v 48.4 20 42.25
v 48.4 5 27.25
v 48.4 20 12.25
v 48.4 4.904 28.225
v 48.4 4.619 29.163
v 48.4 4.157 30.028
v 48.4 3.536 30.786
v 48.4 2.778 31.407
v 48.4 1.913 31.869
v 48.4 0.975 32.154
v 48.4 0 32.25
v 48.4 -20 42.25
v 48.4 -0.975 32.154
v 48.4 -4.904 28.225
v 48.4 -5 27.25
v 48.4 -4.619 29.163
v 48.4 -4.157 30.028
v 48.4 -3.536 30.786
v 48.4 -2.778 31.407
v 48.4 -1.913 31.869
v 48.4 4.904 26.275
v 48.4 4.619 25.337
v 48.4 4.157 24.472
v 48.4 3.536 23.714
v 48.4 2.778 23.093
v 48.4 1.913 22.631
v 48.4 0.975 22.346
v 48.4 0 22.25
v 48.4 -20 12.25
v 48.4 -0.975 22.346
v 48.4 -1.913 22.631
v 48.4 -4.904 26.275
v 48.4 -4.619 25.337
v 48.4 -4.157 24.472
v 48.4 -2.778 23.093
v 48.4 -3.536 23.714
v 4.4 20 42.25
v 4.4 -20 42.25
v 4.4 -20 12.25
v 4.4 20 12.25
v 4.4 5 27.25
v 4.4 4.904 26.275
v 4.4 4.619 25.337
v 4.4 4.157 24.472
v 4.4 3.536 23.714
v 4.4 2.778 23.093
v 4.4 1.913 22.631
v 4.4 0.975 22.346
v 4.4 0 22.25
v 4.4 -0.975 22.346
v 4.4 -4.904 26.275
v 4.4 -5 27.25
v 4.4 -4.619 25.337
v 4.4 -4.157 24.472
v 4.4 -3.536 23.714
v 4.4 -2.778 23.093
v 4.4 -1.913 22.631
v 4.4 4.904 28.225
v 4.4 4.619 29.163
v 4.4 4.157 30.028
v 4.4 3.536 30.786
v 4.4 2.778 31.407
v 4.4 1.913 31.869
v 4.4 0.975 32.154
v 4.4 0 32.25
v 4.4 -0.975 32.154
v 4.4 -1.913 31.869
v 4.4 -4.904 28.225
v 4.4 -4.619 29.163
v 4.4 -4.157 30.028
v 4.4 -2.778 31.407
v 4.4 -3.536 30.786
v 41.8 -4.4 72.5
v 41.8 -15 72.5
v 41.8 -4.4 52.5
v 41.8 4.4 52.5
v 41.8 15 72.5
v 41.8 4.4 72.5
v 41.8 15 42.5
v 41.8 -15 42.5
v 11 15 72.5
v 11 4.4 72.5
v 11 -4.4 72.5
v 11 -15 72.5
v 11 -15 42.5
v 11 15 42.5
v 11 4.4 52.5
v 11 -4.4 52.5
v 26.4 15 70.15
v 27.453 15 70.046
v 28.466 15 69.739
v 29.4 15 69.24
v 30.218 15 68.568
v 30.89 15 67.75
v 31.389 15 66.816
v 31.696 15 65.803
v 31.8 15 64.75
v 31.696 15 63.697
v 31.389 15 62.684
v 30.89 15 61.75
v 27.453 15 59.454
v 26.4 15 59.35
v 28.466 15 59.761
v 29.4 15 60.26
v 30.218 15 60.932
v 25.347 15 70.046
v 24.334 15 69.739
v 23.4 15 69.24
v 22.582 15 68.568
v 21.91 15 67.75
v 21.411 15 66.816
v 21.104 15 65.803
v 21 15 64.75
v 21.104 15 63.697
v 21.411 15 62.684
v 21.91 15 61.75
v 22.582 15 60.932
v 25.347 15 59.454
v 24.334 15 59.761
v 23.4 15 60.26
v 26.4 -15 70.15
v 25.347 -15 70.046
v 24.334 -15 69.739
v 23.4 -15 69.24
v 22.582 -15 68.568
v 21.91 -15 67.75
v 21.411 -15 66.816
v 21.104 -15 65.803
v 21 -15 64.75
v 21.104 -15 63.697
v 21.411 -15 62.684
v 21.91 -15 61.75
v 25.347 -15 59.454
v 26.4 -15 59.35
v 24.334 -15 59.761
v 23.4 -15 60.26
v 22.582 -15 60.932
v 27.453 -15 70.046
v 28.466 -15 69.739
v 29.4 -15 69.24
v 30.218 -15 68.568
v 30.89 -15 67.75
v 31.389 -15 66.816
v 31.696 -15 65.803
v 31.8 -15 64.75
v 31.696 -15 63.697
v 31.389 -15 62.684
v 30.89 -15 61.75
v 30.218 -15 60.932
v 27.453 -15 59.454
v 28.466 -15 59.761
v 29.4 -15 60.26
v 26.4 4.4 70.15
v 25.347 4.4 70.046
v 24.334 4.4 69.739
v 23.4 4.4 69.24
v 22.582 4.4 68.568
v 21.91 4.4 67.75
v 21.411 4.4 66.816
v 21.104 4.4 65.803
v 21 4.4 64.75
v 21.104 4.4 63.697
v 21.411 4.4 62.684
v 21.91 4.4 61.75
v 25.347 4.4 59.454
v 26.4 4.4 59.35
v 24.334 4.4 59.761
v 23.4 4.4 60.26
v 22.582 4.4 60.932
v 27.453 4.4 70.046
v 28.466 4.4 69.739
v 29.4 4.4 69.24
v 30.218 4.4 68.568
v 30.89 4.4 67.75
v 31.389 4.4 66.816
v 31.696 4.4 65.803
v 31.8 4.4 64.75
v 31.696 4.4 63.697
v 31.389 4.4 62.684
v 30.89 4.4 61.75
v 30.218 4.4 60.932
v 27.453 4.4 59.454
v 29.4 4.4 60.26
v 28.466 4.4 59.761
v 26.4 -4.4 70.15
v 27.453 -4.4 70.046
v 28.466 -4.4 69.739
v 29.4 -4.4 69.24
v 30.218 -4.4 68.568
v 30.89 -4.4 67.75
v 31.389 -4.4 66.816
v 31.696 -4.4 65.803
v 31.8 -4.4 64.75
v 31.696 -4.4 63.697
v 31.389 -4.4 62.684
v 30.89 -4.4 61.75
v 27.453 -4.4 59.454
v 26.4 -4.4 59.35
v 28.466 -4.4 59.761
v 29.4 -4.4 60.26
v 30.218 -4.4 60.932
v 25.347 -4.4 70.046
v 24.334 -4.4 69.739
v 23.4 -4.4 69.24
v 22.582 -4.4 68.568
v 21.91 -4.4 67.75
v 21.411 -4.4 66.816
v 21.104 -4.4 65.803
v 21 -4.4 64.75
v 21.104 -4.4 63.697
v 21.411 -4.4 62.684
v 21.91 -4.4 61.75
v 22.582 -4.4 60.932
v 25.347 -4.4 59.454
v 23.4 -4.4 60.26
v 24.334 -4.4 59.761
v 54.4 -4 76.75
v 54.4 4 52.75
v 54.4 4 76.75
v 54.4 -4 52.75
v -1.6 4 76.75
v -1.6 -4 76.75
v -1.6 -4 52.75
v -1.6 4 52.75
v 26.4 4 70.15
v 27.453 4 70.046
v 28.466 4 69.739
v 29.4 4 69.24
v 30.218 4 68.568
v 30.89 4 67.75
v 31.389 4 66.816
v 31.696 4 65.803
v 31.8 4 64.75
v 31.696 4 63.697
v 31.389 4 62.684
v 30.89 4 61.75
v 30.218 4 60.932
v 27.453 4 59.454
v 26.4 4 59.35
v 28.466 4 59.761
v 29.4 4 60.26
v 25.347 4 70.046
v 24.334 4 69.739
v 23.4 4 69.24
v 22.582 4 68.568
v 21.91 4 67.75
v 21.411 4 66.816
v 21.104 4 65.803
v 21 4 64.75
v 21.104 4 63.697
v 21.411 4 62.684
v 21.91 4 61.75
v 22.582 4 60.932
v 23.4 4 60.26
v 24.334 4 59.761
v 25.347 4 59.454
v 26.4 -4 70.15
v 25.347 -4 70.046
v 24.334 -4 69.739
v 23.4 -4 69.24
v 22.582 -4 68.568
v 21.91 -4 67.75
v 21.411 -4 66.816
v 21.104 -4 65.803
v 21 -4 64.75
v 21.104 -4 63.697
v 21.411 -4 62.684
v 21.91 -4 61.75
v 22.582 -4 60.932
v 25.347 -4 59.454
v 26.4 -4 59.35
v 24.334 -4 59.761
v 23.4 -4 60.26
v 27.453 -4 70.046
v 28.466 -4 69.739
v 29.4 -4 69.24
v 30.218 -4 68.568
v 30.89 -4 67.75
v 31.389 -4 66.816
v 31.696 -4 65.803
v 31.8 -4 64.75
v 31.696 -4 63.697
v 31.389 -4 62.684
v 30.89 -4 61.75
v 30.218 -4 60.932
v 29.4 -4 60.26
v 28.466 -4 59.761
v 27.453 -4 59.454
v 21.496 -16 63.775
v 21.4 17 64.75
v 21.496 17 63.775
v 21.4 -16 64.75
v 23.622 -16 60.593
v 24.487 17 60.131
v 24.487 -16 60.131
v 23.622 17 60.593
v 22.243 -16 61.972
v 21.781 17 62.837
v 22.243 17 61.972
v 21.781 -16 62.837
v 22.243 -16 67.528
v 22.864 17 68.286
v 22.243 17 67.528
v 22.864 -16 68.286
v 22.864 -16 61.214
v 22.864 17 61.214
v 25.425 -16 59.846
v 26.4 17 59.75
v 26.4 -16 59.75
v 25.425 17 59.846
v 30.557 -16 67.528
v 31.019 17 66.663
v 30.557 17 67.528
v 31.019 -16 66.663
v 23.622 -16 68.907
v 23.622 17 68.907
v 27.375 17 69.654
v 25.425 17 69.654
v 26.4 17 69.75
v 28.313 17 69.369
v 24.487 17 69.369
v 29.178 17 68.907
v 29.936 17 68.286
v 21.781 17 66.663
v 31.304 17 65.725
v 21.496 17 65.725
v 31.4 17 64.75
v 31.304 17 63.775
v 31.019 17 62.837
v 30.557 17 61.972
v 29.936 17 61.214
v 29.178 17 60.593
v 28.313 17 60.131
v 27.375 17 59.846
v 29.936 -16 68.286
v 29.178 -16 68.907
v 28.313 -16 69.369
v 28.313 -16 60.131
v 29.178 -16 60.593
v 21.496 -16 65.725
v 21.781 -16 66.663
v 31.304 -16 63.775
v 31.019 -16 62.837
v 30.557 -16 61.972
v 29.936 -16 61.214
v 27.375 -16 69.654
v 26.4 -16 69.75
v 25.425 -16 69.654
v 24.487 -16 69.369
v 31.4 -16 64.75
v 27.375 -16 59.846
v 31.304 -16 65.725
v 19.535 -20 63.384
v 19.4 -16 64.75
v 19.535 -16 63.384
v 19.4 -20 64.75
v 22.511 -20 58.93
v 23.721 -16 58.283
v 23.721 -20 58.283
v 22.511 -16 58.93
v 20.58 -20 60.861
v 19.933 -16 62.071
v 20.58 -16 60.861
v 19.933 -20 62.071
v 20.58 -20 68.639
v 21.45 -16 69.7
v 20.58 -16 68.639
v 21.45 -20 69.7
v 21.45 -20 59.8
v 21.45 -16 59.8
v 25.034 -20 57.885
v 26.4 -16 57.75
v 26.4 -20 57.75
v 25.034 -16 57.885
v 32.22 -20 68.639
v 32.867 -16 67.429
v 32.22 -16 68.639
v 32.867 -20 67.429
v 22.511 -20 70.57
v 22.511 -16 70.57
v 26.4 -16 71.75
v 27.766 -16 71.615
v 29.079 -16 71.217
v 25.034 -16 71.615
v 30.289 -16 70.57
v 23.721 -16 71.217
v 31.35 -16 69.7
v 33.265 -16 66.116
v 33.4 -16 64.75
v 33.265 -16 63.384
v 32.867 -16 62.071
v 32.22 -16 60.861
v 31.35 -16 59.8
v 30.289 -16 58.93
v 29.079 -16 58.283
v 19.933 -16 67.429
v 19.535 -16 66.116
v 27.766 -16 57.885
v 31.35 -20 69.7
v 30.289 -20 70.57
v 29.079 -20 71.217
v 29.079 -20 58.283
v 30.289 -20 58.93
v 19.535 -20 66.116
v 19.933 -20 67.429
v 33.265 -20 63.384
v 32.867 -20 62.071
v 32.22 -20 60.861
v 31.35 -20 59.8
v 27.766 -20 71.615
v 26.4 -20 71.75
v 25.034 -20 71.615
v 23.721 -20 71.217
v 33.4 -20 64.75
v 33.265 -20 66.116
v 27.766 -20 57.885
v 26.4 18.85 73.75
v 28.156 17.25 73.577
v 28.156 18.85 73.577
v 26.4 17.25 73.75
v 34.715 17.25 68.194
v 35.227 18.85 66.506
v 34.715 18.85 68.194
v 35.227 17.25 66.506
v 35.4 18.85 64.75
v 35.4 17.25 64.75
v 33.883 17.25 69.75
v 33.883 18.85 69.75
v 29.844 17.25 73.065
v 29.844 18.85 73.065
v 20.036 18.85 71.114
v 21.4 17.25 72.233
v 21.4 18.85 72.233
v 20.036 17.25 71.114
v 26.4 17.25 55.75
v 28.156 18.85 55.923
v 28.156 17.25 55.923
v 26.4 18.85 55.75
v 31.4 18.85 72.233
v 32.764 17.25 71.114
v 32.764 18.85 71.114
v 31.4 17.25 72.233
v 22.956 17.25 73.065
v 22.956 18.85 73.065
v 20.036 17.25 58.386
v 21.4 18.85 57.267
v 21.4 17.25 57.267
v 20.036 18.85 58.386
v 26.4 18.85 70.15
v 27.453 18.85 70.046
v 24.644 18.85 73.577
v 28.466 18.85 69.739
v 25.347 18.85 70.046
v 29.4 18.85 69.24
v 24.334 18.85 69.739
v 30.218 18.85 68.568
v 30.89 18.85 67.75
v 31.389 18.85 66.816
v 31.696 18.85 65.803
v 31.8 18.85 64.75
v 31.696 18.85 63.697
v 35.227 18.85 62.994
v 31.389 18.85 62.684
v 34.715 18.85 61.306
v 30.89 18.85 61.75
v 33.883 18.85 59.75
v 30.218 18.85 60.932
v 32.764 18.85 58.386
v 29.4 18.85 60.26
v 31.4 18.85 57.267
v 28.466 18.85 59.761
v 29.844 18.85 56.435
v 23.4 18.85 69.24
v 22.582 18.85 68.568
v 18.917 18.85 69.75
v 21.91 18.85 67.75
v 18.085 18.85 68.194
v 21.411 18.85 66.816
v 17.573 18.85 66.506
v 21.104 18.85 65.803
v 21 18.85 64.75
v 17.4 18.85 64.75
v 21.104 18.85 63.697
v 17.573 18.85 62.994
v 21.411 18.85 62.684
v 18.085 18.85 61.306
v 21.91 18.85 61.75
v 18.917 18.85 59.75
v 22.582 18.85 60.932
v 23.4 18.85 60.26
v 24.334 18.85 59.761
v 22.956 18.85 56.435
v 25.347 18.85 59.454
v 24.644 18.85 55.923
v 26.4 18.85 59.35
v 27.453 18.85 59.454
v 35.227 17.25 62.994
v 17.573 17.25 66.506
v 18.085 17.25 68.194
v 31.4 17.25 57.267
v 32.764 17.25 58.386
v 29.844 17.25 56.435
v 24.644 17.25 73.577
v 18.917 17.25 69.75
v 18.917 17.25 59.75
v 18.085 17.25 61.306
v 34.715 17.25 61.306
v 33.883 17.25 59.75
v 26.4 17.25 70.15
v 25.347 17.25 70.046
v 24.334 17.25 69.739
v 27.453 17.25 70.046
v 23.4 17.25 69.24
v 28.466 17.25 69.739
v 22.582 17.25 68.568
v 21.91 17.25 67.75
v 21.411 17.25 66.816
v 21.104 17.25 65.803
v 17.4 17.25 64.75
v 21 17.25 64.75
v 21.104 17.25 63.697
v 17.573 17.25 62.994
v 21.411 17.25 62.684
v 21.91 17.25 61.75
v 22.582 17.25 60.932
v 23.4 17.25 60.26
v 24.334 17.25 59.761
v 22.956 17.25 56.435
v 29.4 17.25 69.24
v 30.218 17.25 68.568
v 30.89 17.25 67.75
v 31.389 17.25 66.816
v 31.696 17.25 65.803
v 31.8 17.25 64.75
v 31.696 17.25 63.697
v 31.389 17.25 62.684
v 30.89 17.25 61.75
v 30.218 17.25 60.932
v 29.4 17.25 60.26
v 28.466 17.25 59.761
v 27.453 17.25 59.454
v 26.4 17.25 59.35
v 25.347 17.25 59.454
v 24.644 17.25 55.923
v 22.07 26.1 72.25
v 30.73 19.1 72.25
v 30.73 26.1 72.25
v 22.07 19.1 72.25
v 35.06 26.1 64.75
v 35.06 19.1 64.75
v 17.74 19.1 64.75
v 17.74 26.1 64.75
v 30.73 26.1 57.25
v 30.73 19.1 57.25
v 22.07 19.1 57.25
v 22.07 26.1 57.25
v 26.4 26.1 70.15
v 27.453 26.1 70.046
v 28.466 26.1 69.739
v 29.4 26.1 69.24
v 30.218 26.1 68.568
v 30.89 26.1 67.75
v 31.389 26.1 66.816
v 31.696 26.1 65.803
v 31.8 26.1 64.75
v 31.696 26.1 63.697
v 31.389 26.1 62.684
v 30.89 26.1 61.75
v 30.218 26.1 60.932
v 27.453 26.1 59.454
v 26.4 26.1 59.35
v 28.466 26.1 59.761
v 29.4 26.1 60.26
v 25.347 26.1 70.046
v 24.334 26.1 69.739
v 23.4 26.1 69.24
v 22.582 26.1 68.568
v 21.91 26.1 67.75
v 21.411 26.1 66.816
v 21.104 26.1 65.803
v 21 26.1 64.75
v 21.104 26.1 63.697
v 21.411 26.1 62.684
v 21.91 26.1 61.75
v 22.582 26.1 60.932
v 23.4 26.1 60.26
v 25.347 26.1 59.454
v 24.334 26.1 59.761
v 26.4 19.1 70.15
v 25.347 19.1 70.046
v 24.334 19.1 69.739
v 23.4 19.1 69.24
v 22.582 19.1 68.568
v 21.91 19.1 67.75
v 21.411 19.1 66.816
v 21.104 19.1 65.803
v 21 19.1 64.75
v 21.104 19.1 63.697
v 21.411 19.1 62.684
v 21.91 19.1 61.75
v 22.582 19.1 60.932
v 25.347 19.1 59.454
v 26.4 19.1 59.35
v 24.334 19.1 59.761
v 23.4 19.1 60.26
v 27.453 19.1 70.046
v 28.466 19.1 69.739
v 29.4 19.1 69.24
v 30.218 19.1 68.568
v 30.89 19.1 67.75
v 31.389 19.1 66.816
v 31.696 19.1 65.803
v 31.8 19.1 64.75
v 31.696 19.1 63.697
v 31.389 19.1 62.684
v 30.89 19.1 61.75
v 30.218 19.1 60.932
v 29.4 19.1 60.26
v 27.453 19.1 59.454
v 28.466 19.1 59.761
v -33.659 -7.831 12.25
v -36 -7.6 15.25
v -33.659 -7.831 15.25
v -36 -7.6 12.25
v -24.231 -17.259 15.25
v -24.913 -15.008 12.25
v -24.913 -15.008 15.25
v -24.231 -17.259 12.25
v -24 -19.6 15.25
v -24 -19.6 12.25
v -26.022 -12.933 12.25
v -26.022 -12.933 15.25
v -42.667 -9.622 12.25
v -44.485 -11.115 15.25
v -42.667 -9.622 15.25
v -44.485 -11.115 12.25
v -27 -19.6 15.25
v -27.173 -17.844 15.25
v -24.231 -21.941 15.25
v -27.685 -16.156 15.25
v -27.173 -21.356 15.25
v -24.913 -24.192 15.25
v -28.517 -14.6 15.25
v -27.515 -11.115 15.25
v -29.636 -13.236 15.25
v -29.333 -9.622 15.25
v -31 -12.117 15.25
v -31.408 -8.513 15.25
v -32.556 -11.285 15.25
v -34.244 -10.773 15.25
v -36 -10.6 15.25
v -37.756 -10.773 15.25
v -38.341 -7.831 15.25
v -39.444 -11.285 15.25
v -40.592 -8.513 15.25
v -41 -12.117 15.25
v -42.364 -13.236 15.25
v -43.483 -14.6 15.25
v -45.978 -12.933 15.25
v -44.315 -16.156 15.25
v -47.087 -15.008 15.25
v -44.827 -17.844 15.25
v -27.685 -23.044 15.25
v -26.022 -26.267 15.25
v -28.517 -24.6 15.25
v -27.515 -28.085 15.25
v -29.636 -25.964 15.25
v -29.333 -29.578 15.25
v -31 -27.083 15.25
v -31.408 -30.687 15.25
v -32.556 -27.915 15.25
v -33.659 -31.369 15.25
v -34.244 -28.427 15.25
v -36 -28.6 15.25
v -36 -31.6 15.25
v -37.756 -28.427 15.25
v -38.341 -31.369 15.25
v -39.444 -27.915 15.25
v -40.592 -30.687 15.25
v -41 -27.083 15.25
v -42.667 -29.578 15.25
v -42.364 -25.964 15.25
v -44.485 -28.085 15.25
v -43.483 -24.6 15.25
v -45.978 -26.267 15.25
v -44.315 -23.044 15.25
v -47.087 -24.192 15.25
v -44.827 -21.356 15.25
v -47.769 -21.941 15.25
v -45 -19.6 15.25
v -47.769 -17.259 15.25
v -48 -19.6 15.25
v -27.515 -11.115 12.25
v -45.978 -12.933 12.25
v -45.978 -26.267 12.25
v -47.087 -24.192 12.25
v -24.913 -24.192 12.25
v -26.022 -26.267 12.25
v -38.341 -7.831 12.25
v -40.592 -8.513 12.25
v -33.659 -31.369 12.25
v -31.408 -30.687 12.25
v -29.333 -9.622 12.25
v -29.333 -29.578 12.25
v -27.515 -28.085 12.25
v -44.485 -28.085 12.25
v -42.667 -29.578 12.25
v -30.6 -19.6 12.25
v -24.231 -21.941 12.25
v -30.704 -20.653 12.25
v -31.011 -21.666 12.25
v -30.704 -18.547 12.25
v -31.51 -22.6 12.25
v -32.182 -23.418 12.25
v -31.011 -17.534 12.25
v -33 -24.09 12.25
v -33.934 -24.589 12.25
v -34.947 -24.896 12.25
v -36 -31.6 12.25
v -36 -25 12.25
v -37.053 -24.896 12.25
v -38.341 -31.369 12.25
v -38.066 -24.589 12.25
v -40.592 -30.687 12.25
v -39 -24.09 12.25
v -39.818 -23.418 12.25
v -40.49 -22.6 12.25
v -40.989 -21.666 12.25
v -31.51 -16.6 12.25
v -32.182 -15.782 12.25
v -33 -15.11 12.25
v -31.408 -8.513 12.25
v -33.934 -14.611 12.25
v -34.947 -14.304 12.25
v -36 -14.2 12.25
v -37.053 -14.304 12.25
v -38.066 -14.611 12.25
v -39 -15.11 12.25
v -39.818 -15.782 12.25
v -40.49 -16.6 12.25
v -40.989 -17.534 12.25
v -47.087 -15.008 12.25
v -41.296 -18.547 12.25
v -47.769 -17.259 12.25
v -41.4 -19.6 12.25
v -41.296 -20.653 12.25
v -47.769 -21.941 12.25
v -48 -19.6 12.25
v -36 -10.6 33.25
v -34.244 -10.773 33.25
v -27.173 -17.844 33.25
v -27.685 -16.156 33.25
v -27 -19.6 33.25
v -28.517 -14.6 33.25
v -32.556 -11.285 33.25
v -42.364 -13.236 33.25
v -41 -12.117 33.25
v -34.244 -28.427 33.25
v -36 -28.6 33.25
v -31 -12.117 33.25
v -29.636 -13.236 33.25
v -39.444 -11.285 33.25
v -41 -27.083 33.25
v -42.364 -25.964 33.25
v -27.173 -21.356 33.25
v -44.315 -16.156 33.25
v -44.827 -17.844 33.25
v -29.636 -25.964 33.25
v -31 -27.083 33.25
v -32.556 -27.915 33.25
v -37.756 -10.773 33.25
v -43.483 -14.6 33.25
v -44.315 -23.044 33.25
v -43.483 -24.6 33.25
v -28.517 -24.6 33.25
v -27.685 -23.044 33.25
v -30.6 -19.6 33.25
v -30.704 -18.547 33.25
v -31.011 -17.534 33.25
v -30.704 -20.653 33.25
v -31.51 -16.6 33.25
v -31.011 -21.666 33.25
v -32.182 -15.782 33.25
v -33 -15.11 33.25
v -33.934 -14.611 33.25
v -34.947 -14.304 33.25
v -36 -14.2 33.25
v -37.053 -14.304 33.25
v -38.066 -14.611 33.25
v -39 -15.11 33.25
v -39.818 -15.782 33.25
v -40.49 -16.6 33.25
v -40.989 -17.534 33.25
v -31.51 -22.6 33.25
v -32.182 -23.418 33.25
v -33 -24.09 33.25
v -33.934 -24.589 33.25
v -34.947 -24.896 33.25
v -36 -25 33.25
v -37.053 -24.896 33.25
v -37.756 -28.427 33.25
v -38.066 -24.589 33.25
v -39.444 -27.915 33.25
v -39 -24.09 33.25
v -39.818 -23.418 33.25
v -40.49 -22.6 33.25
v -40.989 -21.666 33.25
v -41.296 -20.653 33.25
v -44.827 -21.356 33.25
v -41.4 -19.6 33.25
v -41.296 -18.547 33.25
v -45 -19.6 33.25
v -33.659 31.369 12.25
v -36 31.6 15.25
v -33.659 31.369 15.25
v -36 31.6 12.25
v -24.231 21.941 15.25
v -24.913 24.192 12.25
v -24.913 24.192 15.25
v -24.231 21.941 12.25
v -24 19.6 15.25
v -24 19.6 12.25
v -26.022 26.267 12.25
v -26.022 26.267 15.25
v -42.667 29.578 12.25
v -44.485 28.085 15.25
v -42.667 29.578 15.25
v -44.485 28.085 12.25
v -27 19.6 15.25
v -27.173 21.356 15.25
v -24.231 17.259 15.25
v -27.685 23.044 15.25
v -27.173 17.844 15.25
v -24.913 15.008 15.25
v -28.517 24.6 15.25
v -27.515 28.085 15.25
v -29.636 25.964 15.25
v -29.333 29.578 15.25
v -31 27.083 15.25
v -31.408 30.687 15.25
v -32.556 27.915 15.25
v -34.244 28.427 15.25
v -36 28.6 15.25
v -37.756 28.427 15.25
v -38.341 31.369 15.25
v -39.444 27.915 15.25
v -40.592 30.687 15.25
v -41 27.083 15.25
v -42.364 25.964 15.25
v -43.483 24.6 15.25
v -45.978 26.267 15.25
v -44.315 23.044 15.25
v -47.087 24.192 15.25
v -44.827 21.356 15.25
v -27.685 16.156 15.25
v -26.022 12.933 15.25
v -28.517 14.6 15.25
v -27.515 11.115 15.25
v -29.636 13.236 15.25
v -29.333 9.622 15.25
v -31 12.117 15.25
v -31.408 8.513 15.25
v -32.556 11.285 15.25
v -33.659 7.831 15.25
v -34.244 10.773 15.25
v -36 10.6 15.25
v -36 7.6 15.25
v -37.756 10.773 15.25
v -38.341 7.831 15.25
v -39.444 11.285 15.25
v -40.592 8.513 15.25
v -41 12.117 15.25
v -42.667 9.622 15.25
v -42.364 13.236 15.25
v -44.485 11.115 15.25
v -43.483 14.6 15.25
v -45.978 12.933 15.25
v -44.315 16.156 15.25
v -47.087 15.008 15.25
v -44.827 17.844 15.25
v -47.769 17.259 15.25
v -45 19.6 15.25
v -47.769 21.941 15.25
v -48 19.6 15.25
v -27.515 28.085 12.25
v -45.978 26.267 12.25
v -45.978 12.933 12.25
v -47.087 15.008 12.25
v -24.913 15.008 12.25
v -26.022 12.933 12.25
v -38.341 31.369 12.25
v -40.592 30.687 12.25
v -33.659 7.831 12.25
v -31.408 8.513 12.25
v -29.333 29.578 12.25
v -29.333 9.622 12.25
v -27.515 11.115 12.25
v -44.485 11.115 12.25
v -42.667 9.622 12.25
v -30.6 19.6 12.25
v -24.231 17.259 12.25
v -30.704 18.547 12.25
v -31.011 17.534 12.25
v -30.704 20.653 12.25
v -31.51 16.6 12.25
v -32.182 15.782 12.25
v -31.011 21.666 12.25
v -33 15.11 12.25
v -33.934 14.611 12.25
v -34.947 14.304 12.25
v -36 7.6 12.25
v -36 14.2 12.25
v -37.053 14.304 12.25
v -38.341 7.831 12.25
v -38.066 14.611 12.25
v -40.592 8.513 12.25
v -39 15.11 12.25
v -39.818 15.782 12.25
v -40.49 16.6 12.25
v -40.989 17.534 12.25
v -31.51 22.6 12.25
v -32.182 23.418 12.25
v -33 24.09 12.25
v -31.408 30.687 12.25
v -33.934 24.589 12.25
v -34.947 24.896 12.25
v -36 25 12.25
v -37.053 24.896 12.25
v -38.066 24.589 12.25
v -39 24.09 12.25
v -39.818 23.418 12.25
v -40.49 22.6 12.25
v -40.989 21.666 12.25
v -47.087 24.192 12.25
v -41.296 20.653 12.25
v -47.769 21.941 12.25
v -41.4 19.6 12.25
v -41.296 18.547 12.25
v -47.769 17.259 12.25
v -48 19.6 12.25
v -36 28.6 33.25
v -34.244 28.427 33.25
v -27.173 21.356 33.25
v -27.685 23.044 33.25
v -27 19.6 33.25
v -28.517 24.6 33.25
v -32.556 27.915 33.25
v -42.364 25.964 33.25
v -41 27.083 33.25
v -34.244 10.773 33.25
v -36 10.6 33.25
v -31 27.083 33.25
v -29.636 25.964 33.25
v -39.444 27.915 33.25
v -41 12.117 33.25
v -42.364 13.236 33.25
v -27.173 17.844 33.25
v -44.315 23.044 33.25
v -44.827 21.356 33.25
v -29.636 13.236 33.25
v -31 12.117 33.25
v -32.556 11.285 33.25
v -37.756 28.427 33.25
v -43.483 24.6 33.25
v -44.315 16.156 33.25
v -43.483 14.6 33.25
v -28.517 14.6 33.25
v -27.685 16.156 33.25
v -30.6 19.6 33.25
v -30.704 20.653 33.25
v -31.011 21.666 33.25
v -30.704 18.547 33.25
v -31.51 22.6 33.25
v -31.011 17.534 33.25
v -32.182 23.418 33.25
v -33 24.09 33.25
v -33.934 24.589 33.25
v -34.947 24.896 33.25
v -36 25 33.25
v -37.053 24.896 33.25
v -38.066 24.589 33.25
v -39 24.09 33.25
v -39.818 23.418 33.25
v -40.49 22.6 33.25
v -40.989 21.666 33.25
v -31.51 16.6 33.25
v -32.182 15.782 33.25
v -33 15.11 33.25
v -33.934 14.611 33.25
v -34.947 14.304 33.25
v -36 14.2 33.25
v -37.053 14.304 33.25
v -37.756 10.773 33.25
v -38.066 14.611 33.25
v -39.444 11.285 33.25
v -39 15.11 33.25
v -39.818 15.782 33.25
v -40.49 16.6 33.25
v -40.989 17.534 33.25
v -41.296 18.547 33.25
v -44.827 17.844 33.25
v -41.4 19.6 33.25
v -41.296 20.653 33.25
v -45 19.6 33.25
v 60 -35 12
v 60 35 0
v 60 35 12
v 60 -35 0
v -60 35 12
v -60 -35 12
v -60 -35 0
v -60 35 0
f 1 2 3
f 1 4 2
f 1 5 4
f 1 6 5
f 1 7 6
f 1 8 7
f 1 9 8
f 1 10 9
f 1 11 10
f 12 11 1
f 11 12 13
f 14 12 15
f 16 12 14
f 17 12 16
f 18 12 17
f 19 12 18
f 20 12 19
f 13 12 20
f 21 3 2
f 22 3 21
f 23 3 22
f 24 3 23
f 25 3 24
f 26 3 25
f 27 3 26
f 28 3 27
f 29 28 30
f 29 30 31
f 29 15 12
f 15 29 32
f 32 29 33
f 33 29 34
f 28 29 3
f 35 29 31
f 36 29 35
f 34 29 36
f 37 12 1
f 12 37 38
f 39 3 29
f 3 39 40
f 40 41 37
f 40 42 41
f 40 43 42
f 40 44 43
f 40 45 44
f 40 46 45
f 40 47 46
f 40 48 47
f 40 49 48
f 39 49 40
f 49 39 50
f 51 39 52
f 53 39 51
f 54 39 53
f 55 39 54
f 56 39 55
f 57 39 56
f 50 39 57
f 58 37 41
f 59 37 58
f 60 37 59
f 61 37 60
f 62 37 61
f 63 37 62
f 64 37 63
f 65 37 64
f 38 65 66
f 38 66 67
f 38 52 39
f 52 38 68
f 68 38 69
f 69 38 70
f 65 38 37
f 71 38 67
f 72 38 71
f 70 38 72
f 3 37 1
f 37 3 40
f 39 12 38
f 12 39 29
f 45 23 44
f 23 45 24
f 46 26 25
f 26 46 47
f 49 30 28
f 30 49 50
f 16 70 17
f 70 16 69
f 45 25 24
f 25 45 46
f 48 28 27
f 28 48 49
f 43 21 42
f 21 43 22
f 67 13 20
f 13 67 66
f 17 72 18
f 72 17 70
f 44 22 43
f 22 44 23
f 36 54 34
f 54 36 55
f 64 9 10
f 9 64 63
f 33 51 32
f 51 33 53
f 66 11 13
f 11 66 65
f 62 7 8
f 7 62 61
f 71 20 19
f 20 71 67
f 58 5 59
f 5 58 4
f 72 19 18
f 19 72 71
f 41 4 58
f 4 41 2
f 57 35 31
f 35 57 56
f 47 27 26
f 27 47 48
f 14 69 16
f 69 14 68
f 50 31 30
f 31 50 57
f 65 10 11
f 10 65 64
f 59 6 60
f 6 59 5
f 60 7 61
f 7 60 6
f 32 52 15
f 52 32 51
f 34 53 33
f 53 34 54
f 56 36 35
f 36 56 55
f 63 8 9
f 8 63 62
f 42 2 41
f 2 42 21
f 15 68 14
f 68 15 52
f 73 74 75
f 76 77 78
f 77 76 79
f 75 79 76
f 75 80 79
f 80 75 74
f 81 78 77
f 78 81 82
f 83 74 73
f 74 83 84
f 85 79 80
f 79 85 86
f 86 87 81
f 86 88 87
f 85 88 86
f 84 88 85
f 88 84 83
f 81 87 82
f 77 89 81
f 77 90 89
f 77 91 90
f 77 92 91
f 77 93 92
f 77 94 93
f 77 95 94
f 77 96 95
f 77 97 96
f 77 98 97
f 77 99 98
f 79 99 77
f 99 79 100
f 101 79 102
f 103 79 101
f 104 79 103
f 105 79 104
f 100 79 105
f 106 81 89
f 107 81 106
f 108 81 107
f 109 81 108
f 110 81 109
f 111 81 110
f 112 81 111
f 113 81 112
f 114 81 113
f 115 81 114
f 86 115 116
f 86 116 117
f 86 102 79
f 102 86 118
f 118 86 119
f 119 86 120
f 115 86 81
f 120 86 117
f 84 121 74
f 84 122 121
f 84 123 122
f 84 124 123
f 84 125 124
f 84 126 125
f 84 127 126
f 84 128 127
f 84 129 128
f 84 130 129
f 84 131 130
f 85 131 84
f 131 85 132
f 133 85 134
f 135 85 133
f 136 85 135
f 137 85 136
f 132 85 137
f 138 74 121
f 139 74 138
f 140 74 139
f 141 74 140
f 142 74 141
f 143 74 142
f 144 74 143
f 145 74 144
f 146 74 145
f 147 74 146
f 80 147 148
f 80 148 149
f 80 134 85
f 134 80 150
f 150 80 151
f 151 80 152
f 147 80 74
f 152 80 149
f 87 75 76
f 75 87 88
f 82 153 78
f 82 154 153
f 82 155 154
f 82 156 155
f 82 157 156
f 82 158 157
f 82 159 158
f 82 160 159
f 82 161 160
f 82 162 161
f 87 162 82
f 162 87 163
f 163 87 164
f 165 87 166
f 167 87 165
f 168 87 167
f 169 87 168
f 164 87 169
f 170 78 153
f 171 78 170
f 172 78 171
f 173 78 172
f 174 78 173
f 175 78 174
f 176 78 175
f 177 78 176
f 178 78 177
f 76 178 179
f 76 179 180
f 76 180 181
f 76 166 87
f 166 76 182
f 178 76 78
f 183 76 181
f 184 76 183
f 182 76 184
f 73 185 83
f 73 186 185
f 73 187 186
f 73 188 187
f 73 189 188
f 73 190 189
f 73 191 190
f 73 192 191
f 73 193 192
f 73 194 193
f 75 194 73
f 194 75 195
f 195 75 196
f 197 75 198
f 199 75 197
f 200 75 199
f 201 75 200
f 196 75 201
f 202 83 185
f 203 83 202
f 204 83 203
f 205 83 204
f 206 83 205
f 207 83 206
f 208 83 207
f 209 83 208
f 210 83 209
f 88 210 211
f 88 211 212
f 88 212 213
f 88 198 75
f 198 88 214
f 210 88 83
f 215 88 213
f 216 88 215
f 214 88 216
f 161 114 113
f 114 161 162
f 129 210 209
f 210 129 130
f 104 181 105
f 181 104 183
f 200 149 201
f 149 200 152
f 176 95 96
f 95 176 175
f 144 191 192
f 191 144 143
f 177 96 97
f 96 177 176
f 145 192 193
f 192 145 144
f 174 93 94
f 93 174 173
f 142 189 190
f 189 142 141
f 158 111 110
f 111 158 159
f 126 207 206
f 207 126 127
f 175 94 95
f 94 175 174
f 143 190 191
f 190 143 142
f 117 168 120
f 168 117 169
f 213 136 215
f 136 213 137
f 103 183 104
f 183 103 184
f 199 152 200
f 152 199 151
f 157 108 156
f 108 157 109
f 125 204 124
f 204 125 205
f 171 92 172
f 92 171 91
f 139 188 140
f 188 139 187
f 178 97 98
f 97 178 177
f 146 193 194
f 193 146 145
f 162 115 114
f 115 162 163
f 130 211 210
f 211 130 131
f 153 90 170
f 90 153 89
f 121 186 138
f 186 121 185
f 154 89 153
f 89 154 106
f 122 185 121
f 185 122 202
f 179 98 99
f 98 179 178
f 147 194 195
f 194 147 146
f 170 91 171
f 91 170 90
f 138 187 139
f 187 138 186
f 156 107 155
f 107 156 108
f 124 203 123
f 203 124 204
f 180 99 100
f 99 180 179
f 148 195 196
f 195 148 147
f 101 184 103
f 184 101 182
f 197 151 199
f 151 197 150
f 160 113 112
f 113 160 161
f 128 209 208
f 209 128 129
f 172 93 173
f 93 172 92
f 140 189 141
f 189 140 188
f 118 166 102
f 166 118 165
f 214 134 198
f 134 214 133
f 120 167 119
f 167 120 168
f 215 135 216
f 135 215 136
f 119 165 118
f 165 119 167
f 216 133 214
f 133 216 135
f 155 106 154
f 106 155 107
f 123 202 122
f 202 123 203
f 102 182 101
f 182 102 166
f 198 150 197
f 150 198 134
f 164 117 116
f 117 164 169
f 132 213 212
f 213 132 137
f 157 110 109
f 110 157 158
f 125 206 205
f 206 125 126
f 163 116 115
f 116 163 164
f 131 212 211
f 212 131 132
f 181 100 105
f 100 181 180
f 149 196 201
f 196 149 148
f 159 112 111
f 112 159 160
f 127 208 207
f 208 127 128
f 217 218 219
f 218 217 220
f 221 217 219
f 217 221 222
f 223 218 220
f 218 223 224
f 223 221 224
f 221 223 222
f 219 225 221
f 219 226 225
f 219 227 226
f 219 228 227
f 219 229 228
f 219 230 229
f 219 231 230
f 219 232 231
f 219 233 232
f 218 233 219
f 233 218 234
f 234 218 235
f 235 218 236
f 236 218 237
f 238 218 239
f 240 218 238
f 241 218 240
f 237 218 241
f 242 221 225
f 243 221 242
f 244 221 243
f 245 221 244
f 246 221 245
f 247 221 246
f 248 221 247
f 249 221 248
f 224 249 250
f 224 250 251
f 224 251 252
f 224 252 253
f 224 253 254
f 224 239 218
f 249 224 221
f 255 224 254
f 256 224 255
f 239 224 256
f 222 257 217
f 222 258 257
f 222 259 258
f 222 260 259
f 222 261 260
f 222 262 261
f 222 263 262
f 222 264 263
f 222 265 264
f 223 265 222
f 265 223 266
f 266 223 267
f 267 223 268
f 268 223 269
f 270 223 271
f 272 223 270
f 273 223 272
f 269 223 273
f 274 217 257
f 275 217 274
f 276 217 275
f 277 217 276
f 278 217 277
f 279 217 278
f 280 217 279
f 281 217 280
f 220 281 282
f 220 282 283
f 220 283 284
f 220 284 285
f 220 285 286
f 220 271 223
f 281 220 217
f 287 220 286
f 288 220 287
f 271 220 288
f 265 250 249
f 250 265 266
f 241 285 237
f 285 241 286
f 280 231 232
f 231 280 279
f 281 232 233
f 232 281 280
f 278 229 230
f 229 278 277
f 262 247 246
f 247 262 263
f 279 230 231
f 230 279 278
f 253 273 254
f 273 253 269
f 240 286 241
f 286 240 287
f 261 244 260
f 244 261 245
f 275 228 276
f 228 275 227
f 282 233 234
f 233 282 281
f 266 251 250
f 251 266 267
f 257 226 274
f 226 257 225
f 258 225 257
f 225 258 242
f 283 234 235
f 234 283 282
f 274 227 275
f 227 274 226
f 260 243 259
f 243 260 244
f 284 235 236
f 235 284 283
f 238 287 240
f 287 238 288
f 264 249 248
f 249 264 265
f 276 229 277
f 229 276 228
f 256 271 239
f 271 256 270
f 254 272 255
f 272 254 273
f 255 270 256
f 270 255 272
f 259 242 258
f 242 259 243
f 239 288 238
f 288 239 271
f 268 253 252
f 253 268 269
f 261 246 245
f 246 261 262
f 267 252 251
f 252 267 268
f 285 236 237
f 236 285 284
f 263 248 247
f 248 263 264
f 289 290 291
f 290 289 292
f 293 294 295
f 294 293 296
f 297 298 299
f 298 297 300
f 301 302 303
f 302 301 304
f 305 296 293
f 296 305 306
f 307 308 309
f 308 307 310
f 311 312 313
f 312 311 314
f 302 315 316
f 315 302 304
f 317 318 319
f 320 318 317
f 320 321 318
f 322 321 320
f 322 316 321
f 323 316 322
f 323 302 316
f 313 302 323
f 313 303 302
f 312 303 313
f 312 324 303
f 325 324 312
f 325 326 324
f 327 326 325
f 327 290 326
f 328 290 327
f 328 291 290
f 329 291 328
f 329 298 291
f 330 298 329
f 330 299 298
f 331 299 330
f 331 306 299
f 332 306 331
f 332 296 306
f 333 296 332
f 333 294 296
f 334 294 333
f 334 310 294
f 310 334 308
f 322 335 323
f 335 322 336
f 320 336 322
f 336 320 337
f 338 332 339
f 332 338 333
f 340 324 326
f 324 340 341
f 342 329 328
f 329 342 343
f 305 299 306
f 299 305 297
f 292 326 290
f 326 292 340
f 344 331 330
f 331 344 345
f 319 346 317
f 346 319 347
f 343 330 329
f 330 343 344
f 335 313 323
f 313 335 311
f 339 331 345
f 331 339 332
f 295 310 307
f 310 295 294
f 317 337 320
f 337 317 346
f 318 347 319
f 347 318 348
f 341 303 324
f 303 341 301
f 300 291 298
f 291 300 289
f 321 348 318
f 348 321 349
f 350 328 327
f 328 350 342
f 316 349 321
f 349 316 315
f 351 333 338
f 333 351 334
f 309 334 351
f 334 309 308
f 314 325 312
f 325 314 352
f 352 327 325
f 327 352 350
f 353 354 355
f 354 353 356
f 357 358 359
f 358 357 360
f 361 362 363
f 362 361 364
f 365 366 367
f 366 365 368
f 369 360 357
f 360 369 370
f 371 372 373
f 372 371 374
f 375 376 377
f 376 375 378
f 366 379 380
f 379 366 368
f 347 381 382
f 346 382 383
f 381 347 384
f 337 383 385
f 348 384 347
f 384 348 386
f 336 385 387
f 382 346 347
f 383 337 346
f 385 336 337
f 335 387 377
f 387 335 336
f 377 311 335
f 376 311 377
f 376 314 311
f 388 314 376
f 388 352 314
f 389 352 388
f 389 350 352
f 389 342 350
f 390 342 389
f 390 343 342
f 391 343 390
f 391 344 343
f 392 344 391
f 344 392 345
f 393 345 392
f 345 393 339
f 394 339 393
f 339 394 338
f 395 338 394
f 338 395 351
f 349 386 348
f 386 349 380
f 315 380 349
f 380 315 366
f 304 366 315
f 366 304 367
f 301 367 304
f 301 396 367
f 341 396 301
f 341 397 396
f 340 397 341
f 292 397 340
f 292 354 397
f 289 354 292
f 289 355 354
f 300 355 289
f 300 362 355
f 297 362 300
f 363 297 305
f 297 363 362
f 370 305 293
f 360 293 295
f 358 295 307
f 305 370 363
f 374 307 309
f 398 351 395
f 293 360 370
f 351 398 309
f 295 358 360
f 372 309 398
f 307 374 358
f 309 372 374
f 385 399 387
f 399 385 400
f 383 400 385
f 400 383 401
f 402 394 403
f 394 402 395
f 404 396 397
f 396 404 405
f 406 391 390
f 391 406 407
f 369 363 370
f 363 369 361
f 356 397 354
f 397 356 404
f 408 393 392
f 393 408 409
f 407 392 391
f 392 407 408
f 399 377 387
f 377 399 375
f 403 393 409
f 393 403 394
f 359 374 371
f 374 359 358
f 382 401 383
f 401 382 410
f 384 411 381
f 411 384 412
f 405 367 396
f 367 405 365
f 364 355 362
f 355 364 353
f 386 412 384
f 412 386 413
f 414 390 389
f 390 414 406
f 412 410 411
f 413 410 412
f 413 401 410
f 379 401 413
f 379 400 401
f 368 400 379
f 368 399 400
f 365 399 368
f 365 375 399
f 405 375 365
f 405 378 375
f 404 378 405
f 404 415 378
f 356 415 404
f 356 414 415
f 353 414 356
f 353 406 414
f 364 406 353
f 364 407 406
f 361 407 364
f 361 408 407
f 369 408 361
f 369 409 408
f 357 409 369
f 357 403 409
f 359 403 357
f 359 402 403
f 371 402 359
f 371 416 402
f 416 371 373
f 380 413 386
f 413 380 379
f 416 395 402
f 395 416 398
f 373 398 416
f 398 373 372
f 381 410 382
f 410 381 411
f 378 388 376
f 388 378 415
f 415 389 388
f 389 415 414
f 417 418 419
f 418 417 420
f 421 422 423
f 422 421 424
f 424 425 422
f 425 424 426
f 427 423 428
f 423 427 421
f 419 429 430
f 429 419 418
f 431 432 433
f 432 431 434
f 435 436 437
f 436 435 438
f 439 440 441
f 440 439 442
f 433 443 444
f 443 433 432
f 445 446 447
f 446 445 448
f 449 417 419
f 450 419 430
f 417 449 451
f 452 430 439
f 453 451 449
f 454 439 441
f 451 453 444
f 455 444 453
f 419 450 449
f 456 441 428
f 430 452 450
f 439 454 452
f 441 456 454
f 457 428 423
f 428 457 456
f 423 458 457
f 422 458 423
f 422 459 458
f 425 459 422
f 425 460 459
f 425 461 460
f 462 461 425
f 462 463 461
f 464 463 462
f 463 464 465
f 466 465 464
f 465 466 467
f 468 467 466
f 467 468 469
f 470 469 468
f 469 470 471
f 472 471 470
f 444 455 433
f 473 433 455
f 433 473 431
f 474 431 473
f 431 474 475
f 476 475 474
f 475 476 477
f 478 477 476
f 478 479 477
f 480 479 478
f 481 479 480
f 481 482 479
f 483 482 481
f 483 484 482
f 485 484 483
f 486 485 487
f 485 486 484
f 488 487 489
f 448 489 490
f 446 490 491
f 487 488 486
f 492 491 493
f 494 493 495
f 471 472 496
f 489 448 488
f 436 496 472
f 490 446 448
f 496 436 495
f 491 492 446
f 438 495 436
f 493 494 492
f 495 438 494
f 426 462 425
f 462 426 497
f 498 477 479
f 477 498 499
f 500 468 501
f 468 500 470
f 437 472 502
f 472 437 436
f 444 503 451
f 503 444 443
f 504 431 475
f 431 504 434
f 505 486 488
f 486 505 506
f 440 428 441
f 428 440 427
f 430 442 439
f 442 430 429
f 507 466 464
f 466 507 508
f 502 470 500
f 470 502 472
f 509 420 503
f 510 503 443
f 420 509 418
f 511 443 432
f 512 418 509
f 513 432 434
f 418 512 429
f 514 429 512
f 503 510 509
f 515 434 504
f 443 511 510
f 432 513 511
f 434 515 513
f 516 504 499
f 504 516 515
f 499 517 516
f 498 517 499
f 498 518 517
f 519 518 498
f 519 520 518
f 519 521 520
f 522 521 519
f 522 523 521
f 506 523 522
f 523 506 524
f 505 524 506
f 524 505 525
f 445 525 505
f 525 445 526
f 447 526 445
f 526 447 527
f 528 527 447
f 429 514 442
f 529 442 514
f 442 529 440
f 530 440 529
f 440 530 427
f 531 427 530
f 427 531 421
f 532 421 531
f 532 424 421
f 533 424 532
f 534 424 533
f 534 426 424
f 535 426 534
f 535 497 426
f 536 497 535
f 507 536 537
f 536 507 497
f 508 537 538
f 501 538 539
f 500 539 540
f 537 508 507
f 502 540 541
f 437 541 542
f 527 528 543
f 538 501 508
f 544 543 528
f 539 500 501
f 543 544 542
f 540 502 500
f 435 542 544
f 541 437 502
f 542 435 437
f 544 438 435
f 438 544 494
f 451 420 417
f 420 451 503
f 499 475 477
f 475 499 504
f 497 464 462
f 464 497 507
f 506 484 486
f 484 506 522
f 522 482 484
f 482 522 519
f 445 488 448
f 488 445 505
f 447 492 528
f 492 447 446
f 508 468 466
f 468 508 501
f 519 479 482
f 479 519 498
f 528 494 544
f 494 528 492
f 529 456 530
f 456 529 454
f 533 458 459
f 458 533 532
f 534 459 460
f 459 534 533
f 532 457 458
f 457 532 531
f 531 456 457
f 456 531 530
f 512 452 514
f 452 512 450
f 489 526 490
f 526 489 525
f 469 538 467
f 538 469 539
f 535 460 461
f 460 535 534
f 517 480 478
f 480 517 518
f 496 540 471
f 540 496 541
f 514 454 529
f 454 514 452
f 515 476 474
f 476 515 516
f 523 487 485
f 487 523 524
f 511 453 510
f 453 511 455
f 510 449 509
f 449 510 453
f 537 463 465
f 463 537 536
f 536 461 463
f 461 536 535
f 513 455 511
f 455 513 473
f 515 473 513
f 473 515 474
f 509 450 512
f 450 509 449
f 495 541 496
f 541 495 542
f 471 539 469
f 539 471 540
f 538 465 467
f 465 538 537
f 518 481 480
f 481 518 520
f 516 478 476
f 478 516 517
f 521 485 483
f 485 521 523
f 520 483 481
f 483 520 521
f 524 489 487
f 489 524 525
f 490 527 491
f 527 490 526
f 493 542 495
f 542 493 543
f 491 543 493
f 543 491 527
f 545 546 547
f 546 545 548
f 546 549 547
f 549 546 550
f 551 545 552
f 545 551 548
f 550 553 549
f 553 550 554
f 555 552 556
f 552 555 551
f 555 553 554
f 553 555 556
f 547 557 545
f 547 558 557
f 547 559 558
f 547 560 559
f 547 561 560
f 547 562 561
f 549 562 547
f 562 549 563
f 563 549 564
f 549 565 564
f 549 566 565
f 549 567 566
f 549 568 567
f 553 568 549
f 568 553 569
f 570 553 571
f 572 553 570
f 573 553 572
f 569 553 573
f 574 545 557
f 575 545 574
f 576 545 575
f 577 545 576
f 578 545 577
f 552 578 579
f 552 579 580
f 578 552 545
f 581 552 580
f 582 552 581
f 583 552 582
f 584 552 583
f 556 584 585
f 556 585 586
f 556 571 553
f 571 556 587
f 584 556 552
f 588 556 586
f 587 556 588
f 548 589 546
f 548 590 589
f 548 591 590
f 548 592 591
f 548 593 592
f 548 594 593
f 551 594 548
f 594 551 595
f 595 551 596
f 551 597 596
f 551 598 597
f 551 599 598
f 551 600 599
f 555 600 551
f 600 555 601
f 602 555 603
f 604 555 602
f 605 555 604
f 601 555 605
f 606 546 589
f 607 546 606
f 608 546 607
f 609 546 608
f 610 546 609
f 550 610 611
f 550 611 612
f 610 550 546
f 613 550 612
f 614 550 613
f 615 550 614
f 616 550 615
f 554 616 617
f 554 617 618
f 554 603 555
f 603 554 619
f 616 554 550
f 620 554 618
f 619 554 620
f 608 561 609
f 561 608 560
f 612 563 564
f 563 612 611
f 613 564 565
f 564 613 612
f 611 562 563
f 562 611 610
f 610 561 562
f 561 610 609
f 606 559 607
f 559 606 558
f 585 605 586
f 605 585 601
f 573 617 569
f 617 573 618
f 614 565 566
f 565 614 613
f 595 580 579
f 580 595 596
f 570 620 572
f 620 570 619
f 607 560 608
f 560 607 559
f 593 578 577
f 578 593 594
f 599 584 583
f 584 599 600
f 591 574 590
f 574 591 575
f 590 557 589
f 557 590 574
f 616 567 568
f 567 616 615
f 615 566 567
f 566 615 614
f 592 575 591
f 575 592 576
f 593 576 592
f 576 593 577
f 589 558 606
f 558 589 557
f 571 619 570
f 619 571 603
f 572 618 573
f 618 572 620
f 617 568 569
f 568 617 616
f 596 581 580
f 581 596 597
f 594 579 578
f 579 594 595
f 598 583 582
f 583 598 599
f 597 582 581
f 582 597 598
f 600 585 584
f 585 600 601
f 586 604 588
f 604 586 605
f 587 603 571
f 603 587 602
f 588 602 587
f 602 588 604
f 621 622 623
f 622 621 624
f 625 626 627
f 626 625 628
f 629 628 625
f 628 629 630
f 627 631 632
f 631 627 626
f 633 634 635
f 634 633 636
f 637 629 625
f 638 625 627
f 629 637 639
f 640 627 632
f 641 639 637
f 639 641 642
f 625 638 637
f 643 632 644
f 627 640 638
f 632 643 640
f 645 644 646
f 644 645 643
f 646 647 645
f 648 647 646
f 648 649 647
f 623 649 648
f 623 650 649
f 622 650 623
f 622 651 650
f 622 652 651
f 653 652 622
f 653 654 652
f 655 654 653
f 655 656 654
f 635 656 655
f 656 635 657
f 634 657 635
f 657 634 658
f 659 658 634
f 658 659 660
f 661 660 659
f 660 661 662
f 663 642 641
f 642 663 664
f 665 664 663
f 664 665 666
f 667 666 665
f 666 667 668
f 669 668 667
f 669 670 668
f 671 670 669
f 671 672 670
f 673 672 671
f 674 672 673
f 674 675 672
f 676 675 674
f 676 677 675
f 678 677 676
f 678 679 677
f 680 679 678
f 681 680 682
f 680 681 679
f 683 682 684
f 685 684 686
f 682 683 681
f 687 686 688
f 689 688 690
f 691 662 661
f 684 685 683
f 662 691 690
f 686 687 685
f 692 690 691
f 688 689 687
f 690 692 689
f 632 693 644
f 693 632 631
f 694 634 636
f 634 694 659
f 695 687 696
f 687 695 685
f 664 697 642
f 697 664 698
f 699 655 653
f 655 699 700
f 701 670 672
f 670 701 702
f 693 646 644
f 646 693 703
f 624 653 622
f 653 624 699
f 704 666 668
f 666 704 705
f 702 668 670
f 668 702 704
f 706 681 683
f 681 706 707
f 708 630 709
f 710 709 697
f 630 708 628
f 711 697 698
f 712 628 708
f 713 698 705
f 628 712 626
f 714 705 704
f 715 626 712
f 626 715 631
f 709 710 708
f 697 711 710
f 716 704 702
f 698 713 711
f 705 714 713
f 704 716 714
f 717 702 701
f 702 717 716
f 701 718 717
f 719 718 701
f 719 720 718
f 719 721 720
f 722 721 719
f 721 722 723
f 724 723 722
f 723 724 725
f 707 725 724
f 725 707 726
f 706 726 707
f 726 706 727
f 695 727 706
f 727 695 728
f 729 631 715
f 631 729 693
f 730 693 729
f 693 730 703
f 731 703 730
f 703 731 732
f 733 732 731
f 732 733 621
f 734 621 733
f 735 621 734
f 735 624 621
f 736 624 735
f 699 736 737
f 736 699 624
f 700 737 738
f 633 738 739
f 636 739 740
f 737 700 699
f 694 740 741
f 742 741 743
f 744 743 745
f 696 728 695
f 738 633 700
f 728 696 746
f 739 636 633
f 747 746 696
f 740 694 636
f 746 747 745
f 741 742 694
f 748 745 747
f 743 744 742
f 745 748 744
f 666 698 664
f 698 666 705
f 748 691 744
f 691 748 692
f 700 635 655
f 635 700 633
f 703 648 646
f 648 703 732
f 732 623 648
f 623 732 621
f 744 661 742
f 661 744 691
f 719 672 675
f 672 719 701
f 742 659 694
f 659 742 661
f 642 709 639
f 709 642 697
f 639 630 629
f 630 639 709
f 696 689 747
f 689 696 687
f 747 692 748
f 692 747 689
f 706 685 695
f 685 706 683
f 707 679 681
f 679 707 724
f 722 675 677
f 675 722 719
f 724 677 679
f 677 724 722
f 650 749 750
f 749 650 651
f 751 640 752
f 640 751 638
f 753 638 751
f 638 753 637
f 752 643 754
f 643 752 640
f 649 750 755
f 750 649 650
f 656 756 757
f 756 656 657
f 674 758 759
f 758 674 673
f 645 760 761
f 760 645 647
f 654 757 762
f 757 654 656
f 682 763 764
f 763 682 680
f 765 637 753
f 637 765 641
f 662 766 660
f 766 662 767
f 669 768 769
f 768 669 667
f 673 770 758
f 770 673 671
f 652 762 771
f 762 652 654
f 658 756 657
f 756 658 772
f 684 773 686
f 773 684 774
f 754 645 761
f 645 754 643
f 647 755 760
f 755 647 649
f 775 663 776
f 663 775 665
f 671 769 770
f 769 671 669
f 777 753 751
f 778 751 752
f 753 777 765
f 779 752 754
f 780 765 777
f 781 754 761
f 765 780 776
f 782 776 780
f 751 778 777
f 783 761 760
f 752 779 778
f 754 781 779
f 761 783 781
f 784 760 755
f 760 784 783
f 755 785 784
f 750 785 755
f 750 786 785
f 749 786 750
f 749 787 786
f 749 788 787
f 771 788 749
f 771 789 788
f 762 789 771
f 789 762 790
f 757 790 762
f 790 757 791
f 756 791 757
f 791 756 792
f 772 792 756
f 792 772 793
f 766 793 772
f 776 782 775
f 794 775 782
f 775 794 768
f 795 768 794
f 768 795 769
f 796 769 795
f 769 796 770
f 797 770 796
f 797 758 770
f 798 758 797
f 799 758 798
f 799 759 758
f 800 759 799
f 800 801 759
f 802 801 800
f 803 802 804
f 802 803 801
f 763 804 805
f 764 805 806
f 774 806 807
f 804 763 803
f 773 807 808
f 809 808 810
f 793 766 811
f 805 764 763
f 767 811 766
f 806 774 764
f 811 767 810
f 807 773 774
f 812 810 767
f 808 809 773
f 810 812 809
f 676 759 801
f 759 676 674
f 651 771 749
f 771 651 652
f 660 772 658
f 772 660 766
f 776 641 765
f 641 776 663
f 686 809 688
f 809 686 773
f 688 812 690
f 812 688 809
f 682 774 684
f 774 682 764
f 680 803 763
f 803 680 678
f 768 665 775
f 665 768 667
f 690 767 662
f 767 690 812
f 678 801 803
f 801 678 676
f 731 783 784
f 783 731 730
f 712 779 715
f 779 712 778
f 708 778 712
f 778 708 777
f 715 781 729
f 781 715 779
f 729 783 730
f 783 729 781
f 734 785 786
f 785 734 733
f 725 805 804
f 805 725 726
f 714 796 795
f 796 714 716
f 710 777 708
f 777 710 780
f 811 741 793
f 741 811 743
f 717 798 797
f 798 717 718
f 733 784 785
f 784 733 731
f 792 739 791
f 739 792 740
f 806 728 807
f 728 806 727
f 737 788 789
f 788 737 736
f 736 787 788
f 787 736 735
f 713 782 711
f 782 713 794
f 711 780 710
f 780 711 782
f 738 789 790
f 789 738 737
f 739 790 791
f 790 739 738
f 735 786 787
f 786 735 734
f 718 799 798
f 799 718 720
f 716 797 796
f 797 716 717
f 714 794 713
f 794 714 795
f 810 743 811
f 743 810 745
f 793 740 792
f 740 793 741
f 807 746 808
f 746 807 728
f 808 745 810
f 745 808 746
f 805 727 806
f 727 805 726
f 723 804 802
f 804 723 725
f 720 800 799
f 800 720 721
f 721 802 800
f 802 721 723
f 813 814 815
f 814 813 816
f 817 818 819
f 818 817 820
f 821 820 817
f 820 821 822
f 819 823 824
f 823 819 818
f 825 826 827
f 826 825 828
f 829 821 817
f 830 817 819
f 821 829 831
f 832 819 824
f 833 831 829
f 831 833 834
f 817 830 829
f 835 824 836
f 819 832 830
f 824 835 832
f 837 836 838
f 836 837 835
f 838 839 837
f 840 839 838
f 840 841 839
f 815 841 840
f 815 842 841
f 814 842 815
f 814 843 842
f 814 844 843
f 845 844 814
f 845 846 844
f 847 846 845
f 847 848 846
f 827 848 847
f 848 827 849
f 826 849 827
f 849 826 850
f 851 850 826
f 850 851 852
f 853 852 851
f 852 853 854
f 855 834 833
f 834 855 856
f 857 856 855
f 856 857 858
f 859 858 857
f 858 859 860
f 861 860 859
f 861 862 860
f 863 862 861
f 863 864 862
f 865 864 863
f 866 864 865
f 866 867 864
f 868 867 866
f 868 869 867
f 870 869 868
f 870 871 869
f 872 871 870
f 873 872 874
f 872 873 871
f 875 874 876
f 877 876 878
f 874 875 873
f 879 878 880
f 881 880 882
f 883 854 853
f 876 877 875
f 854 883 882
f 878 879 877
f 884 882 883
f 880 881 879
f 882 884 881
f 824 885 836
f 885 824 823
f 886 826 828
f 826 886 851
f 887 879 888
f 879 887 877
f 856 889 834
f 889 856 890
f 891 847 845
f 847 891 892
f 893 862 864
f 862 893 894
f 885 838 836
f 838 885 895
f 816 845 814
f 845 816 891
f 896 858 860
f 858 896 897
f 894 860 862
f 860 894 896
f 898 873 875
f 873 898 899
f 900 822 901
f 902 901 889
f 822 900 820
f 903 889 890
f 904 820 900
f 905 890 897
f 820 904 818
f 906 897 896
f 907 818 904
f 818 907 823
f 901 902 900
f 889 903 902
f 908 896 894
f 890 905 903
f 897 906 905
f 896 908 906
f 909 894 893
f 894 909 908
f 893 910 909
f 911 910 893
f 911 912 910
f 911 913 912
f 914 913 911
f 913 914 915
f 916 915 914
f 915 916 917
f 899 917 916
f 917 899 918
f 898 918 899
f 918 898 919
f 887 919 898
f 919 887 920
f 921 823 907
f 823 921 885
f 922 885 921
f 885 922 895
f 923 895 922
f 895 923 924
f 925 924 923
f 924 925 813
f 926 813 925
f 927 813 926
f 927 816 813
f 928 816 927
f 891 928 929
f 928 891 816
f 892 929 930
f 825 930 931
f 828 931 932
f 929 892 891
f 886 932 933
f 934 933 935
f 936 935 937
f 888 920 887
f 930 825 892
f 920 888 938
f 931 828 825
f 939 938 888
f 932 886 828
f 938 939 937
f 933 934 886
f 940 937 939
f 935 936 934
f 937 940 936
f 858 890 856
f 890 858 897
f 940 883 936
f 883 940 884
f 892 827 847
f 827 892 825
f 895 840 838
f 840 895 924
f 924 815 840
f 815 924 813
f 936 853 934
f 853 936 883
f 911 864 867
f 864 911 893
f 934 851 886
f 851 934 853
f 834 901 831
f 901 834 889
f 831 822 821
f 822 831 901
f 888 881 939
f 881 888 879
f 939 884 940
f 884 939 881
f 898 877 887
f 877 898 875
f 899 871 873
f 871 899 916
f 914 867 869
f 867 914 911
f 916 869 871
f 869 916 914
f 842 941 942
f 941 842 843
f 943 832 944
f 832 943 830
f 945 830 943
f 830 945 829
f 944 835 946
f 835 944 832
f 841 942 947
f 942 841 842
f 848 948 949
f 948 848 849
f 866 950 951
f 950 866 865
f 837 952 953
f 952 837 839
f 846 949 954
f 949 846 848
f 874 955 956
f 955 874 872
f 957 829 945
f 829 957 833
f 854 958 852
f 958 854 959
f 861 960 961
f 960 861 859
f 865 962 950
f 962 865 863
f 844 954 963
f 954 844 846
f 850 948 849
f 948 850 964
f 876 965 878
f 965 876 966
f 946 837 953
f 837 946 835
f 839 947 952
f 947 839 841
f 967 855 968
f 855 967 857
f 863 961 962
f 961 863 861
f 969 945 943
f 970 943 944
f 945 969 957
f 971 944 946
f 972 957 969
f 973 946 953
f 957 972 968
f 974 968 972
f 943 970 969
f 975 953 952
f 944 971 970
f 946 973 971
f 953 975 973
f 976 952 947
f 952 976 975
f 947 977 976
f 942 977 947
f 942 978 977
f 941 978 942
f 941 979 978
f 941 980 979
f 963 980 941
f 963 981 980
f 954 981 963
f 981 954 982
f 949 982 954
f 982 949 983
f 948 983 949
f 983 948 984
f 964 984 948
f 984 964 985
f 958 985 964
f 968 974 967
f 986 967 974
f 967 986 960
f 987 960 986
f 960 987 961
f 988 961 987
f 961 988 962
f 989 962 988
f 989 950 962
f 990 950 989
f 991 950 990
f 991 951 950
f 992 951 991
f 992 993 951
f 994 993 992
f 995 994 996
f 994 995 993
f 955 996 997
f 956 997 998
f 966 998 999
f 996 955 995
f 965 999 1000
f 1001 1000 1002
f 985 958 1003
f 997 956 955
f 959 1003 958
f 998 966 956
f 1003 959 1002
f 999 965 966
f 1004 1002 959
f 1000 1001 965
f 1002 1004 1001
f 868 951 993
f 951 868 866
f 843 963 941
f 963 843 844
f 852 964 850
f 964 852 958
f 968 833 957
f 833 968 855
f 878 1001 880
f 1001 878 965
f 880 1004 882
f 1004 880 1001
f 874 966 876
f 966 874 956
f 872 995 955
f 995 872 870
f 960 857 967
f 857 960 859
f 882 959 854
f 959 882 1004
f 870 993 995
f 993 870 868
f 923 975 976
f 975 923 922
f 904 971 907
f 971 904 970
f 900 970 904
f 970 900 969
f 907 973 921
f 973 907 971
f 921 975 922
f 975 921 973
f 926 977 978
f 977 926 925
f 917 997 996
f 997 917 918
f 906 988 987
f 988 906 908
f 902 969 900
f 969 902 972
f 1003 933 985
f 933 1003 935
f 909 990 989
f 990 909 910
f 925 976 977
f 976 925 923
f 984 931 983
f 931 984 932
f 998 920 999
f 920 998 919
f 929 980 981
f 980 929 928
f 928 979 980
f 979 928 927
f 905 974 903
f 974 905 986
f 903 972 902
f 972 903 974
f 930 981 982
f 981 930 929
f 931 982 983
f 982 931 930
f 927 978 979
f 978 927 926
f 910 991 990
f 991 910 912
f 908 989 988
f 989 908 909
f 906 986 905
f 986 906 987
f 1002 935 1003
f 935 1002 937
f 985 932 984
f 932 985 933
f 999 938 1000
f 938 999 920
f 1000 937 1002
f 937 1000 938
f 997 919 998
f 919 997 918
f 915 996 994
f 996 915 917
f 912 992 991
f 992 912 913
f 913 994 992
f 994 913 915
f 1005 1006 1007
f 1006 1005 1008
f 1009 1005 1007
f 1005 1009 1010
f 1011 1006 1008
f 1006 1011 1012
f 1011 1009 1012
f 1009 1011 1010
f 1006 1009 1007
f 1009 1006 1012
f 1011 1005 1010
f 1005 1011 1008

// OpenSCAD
$fn = 32;

// ------------------------------------------------------------------------
// Indexing jig: plate 120 x 70 mm, pin d10
// Every part is its own module, assembly() places every instance.
// ------------------------------------------------------------------------

// --- part 1 ---
module jig_plate() {
  difference() {
    translate([-60, -35, 0]) cube([120, 70, 12]);
  }
}

// --- part 2 ---
module locator_block() {
  difference() {
    translate([-22, -20, 0]) cube([44, 40, 30]);
    translate([0, 0, 15]) rotate([0, 90, 0]) cylinder(h = 46, d = 10, center = true);
  }
}

// --- part 3 ---
module index_fork() {
  difference() {
    translate([-15.4, -15, 0]) cube([30.8, 30, 30]);
    translate([-16.4, -4.4, 10]) cube([32.8, 8.8, 21]);
    translate([0, 0, 22.25]) rotate([90, 0, 0]) cylinder(h = 32, d = 10.8, center = true);
  }
}

// --- part 4 ---
module index_arm() {
  difference() {
    translate([-28, -4, 0]) cube([56, 8, 24]);
    translate([0, 0, 12]) rotate([90, 0, 0]) cylinder(h = 10, d = 10.8, center = true);
  }
}

// --- part 5 ---
module index_pin() {
  rotate([0, 90, 0]) cylinder(h = 34, d = 10, center = true);
  translate([-20, 0, 0]) rotate([0, 90, 0]) cylinder(h = 4, d = 14);
}

// --- part 6 ---
module pin_washer() {
  difference() {
      translate([0, 0, 0]) cylinder(h = 1.6, d = 18);
      translate([0, 0, -1]) cylinder(h = 3.6, d = 10.8);
    }
}

// --- part 7 ---
module lock_nut() {
  difference() {
    linear_extrude(height = 7) polygon(points = [[8.66, 0], [4.33, 7.5], [-4.33, 7.5], [-8.66, 0], [-4.33, -7.5], [4.33, -7.5]]);
    translate([0, 0, -1]) cylinder(h = 9, d = 10.8);
  }
}

// --- part 8 ---
module guide_bush_a() {
  difference() {
    union() {
      cylinder(h = 3, d = 24);
      translate([0, 0, 3]) cylinder(h = 18, d = 18);
    }
    translate([0, 0, -1]) cylinder(h = 23, d = 10.8);
  }
}

// --- part 9 ---
module guide_bush_b() {
  difference() {
    union() {
      cylinder(h = 3, d = 24);
      translate([0, 0, 3]) cylinder(h = 18, d = 18);
    }
    translate([0, 0, -1]) cylinder(h = 23, d = 10.8);
  }
}

// --- assembly ---
module assembly() {
  color([0.80, 0.24, 0.20]) translate([0, 0, 0]) rotate([0, 0, 0]) jig_plate();
  color([0.20, 0.45, 0.75]) translate([26.4, 0, 12.25]) rotate([0, 0, 0]) locator_block();
  color([0.25, 0.62, 0.32]) translate([26.4, 0, 42.5]) rotate([0, 0, 0]) index_fork();
  color([0.92, 0.70, 0.18]) translate([26.4, 0, 52.75]) rotate([0, 0, 0]) index_arm();
  color([0.58, 0.35, 0.70]) translate([26.4, 0, 64.75]) rotate([0, 0, 90]) index_pin();
  color([0.16, 0.66, 0.66]) translate([26.4, 18.85, 64.75]) rotate([90, 0, 0]) pin_washer();
  color([0.85, 0.48, 0.18]) translate([26.4, 26.1, 64.75]) rotate([90, 0, 0]) lock_nut();
  color([0.55, 0.60, 0.65]) translate([-36, -19.6, 12.25]) rotate([0, 0, 0]) guide_bush_a();
  color([0.75, 0.30, 0.55]) translate([-36, 19.6, 12.25]) rotate([0, 0, 0]) guide_bush_b();
}

assembly();
